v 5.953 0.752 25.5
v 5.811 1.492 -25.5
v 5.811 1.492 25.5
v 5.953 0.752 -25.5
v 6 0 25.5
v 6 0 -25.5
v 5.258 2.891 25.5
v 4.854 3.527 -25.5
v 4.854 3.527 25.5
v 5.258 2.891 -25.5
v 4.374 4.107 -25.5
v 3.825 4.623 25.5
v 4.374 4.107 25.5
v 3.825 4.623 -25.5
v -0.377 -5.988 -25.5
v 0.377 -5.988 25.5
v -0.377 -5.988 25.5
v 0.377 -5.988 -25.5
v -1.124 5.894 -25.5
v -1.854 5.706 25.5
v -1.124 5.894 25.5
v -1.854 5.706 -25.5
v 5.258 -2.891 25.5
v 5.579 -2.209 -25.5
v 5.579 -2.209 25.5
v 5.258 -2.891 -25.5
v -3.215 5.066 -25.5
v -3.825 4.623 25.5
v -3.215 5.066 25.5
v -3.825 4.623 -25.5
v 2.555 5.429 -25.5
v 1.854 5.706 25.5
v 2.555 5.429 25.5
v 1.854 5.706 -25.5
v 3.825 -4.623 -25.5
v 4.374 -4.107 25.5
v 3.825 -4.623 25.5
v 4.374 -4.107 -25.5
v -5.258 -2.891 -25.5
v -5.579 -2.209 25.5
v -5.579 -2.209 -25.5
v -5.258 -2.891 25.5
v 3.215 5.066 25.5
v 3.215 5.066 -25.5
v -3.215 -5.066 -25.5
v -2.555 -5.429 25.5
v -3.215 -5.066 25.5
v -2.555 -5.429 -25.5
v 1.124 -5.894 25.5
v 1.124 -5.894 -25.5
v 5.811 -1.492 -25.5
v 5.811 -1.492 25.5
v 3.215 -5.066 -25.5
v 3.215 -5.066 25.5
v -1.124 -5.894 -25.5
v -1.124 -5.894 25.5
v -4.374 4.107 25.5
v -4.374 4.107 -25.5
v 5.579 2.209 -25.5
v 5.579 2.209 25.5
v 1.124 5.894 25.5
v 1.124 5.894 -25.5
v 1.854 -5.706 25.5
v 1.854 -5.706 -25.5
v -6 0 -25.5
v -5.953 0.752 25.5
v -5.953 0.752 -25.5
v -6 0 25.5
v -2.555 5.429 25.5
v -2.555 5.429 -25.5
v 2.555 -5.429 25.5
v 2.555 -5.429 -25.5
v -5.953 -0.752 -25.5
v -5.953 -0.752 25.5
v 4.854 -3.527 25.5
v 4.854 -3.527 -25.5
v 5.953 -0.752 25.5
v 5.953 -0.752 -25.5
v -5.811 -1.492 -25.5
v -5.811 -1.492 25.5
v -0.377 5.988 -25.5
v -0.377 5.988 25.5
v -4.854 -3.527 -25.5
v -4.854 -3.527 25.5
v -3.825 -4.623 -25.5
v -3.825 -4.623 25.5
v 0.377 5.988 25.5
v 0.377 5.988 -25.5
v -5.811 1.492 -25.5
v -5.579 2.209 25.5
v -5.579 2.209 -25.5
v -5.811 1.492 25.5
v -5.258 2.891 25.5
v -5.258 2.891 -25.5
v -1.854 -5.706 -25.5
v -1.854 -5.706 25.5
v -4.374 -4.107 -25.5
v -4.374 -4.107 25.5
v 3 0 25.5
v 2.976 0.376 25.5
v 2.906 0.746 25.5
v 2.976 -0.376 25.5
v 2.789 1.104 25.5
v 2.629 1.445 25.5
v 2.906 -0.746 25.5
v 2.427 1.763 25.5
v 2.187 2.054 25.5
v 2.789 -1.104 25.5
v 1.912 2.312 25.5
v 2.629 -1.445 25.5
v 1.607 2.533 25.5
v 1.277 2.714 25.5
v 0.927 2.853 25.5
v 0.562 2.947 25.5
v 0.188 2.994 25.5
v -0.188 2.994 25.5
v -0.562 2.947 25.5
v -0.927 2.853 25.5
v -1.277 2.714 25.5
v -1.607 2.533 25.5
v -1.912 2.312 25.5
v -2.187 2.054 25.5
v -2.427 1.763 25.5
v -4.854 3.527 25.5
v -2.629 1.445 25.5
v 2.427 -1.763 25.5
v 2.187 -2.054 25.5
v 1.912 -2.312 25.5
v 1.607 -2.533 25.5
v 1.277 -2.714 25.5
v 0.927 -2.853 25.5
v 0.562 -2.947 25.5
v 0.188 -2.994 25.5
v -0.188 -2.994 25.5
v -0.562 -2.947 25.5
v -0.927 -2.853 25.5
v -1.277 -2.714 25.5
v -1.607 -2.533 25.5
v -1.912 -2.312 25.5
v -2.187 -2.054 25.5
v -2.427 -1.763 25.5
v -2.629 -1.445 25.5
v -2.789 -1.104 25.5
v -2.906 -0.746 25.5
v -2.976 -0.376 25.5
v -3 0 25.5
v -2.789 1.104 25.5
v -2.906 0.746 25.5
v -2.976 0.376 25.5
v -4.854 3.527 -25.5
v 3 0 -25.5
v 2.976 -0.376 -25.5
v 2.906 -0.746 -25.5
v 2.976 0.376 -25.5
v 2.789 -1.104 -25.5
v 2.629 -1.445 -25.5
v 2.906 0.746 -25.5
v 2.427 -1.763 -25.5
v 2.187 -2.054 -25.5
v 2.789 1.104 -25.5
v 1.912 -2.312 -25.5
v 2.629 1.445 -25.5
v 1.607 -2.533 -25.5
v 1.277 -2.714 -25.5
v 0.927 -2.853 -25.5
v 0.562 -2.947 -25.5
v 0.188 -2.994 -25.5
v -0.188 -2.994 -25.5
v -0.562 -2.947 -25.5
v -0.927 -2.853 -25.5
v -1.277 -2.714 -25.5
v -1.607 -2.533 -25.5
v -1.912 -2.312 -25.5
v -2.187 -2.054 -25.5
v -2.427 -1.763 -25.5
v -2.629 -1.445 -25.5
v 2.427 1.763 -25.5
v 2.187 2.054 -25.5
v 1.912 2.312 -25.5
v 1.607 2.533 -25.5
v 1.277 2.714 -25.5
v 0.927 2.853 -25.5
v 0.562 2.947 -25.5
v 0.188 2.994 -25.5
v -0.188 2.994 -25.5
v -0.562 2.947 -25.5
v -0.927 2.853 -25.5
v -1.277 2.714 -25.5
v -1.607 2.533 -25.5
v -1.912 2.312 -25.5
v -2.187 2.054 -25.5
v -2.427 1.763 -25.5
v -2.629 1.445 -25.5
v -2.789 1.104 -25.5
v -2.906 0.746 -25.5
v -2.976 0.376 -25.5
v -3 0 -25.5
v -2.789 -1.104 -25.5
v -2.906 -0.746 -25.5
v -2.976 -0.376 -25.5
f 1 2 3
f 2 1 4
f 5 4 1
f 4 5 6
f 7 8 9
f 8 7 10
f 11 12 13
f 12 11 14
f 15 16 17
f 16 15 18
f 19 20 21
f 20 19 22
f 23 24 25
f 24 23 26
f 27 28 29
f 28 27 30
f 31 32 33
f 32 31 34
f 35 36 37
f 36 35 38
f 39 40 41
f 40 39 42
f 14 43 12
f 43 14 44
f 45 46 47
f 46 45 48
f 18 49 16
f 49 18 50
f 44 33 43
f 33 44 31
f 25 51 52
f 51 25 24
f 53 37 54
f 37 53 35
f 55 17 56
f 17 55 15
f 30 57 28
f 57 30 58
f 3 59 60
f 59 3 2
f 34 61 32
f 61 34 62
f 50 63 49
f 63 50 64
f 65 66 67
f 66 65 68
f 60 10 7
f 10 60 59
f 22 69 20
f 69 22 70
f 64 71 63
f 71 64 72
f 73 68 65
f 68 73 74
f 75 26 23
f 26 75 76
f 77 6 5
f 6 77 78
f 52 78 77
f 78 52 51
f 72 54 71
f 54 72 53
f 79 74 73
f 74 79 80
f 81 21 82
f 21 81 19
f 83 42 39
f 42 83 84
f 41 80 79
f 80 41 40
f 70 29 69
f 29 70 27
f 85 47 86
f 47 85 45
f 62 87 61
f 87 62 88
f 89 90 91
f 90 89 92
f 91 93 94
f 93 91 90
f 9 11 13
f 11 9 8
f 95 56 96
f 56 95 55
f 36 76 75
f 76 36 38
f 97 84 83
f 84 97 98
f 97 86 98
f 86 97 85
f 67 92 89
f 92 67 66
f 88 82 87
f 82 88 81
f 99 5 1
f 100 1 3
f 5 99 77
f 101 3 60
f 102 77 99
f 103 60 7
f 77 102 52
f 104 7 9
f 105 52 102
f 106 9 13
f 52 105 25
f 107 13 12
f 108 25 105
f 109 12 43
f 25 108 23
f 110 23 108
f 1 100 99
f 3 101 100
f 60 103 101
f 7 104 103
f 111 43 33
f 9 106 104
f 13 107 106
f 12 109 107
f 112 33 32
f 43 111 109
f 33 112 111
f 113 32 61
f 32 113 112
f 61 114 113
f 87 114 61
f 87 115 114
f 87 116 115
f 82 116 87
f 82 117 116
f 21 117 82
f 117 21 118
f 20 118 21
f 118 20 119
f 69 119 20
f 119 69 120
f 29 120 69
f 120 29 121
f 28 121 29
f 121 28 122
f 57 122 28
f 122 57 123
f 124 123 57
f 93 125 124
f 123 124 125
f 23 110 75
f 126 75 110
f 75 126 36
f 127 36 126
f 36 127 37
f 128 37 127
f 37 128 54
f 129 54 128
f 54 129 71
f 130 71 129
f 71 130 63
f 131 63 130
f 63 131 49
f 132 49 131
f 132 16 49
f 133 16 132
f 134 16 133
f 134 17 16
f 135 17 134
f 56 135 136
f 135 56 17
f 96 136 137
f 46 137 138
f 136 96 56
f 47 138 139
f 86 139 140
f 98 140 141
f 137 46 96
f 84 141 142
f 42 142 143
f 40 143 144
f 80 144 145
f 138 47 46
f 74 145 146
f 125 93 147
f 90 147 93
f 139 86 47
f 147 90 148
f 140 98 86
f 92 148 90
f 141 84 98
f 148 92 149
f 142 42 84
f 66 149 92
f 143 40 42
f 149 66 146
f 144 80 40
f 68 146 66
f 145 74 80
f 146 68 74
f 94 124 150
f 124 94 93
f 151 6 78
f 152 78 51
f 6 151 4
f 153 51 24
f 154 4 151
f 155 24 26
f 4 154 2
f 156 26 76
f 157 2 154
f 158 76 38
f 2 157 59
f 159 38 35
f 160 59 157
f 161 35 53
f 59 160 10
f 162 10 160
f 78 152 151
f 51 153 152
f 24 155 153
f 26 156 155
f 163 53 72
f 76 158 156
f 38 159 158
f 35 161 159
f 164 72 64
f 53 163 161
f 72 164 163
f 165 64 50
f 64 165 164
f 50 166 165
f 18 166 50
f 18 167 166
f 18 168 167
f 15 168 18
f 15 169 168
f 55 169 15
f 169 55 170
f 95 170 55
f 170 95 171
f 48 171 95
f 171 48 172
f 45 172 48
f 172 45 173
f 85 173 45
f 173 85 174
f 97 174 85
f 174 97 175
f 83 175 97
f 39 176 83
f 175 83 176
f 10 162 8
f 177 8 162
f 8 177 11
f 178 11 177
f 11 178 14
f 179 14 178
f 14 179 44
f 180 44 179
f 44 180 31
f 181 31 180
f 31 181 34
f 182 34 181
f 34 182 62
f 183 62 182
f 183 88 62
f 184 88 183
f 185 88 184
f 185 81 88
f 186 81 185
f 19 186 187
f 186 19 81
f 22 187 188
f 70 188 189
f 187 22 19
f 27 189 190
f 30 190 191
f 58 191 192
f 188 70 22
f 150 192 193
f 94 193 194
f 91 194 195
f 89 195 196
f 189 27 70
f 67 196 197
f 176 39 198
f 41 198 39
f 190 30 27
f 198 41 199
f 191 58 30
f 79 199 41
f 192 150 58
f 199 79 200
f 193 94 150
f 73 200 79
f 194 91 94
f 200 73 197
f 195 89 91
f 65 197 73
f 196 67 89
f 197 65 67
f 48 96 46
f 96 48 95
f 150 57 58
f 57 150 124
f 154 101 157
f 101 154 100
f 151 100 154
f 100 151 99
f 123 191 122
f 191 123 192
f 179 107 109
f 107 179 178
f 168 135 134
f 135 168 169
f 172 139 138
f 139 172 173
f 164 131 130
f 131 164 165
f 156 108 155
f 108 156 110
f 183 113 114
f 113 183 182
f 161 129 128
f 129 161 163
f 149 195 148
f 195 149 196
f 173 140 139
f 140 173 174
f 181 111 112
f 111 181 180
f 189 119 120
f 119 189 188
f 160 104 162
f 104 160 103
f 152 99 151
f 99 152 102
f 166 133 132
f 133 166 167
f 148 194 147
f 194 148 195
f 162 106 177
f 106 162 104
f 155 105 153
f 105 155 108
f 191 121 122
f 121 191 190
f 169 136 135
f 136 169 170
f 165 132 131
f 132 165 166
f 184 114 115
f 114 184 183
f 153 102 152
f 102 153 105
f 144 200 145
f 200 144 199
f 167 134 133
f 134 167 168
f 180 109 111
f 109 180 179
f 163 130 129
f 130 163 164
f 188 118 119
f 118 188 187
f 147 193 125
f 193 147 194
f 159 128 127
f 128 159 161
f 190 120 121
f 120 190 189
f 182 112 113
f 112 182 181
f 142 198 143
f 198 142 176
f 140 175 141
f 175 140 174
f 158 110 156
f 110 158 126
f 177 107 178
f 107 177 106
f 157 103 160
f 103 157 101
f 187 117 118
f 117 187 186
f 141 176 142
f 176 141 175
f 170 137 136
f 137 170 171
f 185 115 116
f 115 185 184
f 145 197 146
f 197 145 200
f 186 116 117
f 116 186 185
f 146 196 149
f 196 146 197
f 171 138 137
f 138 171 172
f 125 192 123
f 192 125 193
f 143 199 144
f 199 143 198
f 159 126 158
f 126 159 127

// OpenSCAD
$fn = 50;


difference() {
	union() {
		translate(v = [0, 0, -25.5000000000]) {
			cylinder(h = 51, r = 6.0000000000);
		}
	}
	union() {
		translate(v = [0, 0, -100.0000000000]) {
			cylinder(h = 200, r = 3.0000000000);
		}
	}
}
